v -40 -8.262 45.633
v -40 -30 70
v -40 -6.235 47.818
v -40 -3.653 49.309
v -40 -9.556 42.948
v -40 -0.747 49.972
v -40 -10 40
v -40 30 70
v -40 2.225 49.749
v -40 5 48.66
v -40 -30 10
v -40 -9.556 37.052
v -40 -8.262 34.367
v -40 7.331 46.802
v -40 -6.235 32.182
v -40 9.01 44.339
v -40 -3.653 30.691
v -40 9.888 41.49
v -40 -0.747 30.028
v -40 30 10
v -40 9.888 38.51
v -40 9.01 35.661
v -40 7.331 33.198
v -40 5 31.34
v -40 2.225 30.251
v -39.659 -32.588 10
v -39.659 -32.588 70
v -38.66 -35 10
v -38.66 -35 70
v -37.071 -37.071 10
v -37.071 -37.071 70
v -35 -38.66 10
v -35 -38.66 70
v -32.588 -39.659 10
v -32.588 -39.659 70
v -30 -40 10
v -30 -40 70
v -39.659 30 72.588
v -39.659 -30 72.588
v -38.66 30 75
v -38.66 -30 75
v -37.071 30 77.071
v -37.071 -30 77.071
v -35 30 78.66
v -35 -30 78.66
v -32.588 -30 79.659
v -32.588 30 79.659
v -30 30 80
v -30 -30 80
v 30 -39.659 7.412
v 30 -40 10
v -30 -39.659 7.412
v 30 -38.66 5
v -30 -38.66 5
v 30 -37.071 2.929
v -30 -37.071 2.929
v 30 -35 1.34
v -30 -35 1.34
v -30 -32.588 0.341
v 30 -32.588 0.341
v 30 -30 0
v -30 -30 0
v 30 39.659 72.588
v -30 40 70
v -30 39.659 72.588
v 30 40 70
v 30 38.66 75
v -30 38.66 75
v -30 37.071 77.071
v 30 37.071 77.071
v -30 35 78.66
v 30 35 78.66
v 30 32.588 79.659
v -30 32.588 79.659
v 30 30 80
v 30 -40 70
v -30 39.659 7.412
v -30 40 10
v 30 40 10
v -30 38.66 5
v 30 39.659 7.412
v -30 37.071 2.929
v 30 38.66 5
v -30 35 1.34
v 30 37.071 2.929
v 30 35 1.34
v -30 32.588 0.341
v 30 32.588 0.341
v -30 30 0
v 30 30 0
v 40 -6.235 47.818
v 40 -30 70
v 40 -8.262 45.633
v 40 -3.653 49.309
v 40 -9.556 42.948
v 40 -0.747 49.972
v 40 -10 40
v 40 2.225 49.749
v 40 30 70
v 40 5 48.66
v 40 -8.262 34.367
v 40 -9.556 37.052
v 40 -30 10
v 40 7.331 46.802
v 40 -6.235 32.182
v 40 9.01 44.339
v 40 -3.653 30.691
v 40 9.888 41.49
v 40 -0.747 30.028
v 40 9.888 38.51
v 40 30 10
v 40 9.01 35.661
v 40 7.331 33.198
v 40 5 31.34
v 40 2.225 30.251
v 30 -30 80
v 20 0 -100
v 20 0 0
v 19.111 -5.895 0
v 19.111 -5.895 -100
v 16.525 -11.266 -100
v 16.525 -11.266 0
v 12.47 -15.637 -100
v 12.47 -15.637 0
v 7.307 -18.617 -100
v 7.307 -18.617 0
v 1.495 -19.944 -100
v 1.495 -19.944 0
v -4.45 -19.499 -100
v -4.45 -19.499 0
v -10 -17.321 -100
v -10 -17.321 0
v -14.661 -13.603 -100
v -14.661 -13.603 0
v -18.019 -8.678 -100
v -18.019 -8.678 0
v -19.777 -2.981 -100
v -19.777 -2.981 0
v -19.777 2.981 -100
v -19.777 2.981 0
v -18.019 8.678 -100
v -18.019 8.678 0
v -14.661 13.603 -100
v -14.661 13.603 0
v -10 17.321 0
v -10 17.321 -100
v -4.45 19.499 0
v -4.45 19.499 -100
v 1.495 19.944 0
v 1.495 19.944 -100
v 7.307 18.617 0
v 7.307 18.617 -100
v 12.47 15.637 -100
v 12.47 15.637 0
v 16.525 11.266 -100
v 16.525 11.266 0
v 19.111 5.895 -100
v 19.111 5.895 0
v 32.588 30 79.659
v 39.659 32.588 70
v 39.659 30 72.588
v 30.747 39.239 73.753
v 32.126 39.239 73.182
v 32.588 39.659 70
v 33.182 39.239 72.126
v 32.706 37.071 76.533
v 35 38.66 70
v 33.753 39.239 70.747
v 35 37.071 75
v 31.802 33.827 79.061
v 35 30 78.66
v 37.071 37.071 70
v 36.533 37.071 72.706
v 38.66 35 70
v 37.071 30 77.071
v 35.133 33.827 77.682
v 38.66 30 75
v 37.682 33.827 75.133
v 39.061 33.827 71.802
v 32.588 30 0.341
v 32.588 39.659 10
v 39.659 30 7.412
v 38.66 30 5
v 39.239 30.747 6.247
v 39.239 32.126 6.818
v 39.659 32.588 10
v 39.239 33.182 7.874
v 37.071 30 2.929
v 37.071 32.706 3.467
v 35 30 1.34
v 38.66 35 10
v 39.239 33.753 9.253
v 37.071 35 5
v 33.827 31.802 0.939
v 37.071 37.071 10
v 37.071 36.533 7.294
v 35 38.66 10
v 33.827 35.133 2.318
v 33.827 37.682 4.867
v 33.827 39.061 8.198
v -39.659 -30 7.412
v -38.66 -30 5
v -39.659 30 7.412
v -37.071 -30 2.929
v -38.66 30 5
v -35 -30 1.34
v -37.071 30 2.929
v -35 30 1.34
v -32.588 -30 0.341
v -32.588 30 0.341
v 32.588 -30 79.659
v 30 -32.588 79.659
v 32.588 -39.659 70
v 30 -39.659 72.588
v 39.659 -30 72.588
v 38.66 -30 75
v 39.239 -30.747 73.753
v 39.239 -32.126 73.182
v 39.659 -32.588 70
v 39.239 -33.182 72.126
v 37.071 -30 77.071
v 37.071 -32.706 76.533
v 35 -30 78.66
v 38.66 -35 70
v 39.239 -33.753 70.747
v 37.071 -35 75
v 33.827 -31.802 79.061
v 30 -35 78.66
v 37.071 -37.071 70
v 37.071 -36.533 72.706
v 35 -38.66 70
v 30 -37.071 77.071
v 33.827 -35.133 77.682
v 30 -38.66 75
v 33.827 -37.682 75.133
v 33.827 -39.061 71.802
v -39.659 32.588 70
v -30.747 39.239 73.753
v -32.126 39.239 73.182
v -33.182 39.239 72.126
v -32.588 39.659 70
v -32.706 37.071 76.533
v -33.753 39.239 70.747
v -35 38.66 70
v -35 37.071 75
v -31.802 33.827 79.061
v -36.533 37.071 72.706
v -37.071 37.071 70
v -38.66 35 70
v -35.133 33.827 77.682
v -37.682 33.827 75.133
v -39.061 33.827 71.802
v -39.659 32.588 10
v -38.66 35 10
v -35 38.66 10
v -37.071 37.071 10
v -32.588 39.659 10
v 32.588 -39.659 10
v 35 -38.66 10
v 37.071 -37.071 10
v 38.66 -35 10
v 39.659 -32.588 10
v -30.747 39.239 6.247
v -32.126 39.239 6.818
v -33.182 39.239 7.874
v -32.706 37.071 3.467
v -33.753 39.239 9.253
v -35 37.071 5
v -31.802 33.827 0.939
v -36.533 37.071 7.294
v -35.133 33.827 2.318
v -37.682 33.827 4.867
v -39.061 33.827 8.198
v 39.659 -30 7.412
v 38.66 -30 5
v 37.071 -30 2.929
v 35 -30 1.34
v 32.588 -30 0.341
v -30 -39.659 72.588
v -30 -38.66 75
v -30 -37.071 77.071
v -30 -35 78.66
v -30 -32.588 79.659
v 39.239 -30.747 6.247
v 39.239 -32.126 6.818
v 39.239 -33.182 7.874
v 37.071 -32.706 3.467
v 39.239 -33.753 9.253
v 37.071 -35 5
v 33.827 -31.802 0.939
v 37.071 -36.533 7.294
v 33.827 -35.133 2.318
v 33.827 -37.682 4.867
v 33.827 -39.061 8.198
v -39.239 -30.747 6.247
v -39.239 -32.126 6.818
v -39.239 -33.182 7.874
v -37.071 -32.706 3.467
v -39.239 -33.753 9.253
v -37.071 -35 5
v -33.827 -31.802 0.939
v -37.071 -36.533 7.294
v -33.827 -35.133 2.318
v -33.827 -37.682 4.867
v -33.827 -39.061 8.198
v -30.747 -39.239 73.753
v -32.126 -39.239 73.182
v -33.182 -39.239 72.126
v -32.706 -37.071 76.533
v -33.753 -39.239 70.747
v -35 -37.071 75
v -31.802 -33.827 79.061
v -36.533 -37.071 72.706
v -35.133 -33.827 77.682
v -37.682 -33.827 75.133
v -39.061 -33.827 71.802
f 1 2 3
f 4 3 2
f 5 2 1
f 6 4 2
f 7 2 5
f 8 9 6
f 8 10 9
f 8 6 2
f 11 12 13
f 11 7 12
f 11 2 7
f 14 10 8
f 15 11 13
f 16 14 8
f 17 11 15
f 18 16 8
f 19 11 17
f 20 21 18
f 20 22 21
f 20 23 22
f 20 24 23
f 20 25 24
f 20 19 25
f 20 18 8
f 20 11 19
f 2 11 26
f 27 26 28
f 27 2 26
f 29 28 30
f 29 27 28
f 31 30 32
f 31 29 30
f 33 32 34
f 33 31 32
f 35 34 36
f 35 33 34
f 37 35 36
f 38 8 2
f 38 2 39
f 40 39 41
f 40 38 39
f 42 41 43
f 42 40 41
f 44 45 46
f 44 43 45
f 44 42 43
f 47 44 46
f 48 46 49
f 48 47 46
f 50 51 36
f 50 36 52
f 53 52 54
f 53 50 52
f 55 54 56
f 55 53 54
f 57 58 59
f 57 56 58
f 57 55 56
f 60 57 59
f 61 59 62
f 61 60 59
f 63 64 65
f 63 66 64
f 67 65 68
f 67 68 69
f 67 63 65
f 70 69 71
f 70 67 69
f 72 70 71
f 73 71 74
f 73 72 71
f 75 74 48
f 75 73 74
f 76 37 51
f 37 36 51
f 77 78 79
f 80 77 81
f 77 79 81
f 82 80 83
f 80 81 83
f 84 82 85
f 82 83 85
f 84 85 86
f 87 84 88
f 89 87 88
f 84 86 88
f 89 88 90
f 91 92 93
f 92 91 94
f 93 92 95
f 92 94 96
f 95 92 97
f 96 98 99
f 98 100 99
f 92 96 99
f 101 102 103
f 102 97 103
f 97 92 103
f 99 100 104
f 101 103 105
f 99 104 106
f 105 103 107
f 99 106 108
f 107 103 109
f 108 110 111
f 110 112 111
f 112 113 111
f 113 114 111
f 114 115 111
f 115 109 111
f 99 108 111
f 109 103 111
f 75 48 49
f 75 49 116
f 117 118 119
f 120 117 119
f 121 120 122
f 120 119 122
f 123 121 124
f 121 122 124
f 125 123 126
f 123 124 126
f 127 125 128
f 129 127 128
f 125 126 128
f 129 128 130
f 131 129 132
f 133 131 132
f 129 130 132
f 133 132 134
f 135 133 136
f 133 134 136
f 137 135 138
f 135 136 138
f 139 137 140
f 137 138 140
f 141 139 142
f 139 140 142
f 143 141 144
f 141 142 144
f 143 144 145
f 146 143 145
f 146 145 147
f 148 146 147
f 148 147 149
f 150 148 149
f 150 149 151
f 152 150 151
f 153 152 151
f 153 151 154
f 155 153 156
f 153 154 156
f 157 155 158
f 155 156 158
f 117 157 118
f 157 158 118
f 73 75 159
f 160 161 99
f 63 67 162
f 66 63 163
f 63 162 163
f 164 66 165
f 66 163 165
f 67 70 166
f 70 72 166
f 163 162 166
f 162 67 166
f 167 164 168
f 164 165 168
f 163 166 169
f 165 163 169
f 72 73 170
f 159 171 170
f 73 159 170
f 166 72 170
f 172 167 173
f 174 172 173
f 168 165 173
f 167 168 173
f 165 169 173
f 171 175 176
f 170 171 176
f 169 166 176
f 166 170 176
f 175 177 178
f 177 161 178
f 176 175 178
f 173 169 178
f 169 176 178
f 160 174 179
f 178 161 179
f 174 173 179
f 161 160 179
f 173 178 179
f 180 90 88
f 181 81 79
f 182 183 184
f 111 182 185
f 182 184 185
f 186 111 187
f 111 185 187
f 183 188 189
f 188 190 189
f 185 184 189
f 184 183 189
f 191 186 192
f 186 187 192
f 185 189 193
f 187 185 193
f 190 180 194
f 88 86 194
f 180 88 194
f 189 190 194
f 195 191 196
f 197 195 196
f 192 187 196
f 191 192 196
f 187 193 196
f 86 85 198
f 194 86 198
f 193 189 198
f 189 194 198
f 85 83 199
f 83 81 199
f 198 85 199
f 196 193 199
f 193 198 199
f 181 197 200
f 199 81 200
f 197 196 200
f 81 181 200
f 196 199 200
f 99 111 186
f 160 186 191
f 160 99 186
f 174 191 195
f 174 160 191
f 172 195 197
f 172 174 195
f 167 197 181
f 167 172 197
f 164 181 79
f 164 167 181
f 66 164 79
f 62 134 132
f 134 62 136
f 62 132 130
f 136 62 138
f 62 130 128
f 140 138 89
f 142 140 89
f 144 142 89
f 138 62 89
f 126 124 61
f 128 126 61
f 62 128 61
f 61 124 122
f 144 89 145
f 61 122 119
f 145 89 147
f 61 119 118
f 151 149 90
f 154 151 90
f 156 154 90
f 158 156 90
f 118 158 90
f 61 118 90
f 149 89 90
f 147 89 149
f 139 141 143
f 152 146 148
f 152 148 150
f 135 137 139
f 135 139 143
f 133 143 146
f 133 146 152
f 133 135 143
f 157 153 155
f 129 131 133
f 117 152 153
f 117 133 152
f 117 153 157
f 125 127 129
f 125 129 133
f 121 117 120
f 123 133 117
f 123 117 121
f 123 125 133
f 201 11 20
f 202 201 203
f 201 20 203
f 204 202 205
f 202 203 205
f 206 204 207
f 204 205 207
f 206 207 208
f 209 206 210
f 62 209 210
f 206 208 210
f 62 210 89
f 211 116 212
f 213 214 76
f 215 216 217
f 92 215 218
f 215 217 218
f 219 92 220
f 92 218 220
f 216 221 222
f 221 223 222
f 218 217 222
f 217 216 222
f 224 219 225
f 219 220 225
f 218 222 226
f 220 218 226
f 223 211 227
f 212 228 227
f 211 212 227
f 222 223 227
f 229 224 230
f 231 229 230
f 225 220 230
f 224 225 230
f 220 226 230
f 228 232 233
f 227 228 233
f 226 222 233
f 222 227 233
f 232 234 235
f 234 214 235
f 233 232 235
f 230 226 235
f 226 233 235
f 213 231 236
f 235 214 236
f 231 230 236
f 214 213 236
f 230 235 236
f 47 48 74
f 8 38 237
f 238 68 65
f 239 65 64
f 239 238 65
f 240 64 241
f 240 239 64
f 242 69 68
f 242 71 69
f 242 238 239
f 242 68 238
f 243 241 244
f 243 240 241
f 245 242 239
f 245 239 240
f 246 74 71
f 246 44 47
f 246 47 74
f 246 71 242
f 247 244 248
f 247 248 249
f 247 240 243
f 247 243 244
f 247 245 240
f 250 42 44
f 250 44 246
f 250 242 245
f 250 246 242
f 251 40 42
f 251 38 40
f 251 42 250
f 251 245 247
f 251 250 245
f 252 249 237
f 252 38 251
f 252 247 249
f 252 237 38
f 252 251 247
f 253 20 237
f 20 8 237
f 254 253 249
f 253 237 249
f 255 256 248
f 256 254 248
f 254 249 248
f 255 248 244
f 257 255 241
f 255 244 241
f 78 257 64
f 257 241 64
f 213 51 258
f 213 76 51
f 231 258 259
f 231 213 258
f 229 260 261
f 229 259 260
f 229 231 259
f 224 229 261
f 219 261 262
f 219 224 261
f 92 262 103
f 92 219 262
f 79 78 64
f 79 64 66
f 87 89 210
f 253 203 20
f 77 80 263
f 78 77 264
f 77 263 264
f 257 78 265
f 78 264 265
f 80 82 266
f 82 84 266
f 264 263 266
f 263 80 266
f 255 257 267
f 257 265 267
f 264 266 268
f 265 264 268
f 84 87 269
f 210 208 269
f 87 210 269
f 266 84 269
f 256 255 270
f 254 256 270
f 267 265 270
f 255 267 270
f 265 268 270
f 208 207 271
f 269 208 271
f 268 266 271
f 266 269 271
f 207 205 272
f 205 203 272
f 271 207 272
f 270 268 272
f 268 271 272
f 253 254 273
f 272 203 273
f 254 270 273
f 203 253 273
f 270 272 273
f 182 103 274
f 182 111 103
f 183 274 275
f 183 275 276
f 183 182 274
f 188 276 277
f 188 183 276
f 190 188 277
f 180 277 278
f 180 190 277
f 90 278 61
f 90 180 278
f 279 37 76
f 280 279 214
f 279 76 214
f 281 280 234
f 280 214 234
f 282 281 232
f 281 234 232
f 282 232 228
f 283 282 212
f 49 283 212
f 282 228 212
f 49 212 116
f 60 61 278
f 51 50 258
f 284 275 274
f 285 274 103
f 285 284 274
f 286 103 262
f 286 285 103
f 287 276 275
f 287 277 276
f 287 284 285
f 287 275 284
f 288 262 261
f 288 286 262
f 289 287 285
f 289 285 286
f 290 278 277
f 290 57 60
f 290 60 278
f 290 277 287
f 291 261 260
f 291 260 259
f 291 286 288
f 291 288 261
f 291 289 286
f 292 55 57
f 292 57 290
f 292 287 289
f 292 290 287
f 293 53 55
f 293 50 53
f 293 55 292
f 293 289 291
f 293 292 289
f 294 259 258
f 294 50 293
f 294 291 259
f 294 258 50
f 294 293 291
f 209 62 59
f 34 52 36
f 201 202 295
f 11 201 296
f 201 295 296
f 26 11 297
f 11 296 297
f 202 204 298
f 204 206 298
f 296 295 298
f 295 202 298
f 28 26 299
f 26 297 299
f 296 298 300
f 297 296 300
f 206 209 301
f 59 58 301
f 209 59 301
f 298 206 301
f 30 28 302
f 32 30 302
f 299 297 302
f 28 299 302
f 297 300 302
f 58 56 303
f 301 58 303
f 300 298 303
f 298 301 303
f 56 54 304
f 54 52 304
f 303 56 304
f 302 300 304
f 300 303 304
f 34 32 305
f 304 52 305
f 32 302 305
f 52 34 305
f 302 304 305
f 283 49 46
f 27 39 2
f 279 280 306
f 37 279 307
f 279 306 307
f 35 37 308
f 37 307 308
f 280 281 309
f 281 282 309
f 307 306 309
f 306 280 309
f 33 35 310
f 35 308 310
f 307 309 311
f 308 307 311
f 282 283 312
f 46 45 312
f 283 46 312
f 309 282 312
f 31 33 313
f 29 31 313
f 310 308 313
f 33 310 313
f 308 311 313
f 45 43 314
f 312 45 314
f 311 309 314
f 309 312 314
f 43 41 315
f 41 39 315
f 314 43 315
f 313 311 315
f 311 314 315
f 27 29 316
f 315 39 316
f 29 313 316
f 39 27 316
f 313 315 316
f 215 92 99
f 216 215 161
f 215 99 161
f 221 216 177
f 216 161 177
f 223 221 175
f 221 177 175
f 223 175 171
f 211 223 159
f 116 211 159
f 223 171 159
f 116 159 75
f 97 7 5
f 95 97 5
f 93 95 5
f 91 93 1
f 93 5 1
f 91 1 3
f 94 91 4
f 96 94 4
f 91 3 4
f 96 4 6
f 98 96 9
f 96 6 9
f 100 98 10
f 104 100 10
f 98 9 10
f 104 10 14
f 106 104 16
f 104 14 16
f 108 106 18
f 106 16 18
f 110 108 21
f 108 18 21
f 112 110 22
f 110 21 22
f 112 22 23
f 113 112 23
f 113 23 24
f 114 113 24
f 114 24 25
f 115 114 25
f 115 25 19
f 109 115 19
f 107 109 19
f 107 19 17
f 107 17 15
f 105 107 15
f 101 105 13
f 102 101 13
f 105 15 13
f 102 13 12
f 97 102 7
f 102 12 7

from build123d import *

# Parameters (mm, degrees)
BOX_SKETCH_W       = 80
BOX_SKETCH_H       = 80
BOX_EXTRUDE_DEPTH  = 80
BOX_FILLET_R       = 10
POLE_SKETCH_R      = 20
POLE_EXTRUDE_DEPTH = 100
HOLE_SKETCH_R      = 10
HOLE_CUT_DEPTH     = 80


with BuildPart() as part:
    # Box Sketch → Box Extrude (new body)
    with BuildSketch(Plane.XY):
        Rectangle(BOX_SKETCH_W, BOX_SKETCH_H)
    extrude(amount=BOX_EXTRUDE_DEPTH)

    # Box Fillet
    box_fillet_edges = [part.edges().sort_by_distance(p)[0] for p in [
        (-40, 0, 80),
        (0, -40, 80),
        (40, 0, 80),
        (0, -40, 0),
        (-40, 0, 0),
        (0, 40, 0),
        (40, 0, 0),
        (0, 40, 80),
        (40, -40, 40),
        (-40, -40, 40),
        (-40, 40, 40),
        (40, 40, 40),
    ]]
    fillet(box_fillet_edges, radius=BOX_FILLET_R)

    # Pole Sketch → Pole Extrude (add)
    with BuildSketch(Plane(origin=(0, 0, 0), x_dir=(-1, 0, 0), z_dir=(0, 0, -1))):
        with Locations(Location((0, 0, 0), (0, 0, 180))):
            Circle(POLE_SKETCH_R)
    extrude(amount=POLE_EXTRUDE_DEPTH)

    # Hole Sketch → Hole Cut (cut)
    with BuildSketch(Plane.ZY.offset(40)):
        with Locations(Location((40, 0, 0), (0, 0, 270))):
            Circle(HOLE_SKETCH_R)
    extrude(amount=-HOLE_CUT_DEPTH, mode=Mode.SUBTRACT)


solid = part.part
